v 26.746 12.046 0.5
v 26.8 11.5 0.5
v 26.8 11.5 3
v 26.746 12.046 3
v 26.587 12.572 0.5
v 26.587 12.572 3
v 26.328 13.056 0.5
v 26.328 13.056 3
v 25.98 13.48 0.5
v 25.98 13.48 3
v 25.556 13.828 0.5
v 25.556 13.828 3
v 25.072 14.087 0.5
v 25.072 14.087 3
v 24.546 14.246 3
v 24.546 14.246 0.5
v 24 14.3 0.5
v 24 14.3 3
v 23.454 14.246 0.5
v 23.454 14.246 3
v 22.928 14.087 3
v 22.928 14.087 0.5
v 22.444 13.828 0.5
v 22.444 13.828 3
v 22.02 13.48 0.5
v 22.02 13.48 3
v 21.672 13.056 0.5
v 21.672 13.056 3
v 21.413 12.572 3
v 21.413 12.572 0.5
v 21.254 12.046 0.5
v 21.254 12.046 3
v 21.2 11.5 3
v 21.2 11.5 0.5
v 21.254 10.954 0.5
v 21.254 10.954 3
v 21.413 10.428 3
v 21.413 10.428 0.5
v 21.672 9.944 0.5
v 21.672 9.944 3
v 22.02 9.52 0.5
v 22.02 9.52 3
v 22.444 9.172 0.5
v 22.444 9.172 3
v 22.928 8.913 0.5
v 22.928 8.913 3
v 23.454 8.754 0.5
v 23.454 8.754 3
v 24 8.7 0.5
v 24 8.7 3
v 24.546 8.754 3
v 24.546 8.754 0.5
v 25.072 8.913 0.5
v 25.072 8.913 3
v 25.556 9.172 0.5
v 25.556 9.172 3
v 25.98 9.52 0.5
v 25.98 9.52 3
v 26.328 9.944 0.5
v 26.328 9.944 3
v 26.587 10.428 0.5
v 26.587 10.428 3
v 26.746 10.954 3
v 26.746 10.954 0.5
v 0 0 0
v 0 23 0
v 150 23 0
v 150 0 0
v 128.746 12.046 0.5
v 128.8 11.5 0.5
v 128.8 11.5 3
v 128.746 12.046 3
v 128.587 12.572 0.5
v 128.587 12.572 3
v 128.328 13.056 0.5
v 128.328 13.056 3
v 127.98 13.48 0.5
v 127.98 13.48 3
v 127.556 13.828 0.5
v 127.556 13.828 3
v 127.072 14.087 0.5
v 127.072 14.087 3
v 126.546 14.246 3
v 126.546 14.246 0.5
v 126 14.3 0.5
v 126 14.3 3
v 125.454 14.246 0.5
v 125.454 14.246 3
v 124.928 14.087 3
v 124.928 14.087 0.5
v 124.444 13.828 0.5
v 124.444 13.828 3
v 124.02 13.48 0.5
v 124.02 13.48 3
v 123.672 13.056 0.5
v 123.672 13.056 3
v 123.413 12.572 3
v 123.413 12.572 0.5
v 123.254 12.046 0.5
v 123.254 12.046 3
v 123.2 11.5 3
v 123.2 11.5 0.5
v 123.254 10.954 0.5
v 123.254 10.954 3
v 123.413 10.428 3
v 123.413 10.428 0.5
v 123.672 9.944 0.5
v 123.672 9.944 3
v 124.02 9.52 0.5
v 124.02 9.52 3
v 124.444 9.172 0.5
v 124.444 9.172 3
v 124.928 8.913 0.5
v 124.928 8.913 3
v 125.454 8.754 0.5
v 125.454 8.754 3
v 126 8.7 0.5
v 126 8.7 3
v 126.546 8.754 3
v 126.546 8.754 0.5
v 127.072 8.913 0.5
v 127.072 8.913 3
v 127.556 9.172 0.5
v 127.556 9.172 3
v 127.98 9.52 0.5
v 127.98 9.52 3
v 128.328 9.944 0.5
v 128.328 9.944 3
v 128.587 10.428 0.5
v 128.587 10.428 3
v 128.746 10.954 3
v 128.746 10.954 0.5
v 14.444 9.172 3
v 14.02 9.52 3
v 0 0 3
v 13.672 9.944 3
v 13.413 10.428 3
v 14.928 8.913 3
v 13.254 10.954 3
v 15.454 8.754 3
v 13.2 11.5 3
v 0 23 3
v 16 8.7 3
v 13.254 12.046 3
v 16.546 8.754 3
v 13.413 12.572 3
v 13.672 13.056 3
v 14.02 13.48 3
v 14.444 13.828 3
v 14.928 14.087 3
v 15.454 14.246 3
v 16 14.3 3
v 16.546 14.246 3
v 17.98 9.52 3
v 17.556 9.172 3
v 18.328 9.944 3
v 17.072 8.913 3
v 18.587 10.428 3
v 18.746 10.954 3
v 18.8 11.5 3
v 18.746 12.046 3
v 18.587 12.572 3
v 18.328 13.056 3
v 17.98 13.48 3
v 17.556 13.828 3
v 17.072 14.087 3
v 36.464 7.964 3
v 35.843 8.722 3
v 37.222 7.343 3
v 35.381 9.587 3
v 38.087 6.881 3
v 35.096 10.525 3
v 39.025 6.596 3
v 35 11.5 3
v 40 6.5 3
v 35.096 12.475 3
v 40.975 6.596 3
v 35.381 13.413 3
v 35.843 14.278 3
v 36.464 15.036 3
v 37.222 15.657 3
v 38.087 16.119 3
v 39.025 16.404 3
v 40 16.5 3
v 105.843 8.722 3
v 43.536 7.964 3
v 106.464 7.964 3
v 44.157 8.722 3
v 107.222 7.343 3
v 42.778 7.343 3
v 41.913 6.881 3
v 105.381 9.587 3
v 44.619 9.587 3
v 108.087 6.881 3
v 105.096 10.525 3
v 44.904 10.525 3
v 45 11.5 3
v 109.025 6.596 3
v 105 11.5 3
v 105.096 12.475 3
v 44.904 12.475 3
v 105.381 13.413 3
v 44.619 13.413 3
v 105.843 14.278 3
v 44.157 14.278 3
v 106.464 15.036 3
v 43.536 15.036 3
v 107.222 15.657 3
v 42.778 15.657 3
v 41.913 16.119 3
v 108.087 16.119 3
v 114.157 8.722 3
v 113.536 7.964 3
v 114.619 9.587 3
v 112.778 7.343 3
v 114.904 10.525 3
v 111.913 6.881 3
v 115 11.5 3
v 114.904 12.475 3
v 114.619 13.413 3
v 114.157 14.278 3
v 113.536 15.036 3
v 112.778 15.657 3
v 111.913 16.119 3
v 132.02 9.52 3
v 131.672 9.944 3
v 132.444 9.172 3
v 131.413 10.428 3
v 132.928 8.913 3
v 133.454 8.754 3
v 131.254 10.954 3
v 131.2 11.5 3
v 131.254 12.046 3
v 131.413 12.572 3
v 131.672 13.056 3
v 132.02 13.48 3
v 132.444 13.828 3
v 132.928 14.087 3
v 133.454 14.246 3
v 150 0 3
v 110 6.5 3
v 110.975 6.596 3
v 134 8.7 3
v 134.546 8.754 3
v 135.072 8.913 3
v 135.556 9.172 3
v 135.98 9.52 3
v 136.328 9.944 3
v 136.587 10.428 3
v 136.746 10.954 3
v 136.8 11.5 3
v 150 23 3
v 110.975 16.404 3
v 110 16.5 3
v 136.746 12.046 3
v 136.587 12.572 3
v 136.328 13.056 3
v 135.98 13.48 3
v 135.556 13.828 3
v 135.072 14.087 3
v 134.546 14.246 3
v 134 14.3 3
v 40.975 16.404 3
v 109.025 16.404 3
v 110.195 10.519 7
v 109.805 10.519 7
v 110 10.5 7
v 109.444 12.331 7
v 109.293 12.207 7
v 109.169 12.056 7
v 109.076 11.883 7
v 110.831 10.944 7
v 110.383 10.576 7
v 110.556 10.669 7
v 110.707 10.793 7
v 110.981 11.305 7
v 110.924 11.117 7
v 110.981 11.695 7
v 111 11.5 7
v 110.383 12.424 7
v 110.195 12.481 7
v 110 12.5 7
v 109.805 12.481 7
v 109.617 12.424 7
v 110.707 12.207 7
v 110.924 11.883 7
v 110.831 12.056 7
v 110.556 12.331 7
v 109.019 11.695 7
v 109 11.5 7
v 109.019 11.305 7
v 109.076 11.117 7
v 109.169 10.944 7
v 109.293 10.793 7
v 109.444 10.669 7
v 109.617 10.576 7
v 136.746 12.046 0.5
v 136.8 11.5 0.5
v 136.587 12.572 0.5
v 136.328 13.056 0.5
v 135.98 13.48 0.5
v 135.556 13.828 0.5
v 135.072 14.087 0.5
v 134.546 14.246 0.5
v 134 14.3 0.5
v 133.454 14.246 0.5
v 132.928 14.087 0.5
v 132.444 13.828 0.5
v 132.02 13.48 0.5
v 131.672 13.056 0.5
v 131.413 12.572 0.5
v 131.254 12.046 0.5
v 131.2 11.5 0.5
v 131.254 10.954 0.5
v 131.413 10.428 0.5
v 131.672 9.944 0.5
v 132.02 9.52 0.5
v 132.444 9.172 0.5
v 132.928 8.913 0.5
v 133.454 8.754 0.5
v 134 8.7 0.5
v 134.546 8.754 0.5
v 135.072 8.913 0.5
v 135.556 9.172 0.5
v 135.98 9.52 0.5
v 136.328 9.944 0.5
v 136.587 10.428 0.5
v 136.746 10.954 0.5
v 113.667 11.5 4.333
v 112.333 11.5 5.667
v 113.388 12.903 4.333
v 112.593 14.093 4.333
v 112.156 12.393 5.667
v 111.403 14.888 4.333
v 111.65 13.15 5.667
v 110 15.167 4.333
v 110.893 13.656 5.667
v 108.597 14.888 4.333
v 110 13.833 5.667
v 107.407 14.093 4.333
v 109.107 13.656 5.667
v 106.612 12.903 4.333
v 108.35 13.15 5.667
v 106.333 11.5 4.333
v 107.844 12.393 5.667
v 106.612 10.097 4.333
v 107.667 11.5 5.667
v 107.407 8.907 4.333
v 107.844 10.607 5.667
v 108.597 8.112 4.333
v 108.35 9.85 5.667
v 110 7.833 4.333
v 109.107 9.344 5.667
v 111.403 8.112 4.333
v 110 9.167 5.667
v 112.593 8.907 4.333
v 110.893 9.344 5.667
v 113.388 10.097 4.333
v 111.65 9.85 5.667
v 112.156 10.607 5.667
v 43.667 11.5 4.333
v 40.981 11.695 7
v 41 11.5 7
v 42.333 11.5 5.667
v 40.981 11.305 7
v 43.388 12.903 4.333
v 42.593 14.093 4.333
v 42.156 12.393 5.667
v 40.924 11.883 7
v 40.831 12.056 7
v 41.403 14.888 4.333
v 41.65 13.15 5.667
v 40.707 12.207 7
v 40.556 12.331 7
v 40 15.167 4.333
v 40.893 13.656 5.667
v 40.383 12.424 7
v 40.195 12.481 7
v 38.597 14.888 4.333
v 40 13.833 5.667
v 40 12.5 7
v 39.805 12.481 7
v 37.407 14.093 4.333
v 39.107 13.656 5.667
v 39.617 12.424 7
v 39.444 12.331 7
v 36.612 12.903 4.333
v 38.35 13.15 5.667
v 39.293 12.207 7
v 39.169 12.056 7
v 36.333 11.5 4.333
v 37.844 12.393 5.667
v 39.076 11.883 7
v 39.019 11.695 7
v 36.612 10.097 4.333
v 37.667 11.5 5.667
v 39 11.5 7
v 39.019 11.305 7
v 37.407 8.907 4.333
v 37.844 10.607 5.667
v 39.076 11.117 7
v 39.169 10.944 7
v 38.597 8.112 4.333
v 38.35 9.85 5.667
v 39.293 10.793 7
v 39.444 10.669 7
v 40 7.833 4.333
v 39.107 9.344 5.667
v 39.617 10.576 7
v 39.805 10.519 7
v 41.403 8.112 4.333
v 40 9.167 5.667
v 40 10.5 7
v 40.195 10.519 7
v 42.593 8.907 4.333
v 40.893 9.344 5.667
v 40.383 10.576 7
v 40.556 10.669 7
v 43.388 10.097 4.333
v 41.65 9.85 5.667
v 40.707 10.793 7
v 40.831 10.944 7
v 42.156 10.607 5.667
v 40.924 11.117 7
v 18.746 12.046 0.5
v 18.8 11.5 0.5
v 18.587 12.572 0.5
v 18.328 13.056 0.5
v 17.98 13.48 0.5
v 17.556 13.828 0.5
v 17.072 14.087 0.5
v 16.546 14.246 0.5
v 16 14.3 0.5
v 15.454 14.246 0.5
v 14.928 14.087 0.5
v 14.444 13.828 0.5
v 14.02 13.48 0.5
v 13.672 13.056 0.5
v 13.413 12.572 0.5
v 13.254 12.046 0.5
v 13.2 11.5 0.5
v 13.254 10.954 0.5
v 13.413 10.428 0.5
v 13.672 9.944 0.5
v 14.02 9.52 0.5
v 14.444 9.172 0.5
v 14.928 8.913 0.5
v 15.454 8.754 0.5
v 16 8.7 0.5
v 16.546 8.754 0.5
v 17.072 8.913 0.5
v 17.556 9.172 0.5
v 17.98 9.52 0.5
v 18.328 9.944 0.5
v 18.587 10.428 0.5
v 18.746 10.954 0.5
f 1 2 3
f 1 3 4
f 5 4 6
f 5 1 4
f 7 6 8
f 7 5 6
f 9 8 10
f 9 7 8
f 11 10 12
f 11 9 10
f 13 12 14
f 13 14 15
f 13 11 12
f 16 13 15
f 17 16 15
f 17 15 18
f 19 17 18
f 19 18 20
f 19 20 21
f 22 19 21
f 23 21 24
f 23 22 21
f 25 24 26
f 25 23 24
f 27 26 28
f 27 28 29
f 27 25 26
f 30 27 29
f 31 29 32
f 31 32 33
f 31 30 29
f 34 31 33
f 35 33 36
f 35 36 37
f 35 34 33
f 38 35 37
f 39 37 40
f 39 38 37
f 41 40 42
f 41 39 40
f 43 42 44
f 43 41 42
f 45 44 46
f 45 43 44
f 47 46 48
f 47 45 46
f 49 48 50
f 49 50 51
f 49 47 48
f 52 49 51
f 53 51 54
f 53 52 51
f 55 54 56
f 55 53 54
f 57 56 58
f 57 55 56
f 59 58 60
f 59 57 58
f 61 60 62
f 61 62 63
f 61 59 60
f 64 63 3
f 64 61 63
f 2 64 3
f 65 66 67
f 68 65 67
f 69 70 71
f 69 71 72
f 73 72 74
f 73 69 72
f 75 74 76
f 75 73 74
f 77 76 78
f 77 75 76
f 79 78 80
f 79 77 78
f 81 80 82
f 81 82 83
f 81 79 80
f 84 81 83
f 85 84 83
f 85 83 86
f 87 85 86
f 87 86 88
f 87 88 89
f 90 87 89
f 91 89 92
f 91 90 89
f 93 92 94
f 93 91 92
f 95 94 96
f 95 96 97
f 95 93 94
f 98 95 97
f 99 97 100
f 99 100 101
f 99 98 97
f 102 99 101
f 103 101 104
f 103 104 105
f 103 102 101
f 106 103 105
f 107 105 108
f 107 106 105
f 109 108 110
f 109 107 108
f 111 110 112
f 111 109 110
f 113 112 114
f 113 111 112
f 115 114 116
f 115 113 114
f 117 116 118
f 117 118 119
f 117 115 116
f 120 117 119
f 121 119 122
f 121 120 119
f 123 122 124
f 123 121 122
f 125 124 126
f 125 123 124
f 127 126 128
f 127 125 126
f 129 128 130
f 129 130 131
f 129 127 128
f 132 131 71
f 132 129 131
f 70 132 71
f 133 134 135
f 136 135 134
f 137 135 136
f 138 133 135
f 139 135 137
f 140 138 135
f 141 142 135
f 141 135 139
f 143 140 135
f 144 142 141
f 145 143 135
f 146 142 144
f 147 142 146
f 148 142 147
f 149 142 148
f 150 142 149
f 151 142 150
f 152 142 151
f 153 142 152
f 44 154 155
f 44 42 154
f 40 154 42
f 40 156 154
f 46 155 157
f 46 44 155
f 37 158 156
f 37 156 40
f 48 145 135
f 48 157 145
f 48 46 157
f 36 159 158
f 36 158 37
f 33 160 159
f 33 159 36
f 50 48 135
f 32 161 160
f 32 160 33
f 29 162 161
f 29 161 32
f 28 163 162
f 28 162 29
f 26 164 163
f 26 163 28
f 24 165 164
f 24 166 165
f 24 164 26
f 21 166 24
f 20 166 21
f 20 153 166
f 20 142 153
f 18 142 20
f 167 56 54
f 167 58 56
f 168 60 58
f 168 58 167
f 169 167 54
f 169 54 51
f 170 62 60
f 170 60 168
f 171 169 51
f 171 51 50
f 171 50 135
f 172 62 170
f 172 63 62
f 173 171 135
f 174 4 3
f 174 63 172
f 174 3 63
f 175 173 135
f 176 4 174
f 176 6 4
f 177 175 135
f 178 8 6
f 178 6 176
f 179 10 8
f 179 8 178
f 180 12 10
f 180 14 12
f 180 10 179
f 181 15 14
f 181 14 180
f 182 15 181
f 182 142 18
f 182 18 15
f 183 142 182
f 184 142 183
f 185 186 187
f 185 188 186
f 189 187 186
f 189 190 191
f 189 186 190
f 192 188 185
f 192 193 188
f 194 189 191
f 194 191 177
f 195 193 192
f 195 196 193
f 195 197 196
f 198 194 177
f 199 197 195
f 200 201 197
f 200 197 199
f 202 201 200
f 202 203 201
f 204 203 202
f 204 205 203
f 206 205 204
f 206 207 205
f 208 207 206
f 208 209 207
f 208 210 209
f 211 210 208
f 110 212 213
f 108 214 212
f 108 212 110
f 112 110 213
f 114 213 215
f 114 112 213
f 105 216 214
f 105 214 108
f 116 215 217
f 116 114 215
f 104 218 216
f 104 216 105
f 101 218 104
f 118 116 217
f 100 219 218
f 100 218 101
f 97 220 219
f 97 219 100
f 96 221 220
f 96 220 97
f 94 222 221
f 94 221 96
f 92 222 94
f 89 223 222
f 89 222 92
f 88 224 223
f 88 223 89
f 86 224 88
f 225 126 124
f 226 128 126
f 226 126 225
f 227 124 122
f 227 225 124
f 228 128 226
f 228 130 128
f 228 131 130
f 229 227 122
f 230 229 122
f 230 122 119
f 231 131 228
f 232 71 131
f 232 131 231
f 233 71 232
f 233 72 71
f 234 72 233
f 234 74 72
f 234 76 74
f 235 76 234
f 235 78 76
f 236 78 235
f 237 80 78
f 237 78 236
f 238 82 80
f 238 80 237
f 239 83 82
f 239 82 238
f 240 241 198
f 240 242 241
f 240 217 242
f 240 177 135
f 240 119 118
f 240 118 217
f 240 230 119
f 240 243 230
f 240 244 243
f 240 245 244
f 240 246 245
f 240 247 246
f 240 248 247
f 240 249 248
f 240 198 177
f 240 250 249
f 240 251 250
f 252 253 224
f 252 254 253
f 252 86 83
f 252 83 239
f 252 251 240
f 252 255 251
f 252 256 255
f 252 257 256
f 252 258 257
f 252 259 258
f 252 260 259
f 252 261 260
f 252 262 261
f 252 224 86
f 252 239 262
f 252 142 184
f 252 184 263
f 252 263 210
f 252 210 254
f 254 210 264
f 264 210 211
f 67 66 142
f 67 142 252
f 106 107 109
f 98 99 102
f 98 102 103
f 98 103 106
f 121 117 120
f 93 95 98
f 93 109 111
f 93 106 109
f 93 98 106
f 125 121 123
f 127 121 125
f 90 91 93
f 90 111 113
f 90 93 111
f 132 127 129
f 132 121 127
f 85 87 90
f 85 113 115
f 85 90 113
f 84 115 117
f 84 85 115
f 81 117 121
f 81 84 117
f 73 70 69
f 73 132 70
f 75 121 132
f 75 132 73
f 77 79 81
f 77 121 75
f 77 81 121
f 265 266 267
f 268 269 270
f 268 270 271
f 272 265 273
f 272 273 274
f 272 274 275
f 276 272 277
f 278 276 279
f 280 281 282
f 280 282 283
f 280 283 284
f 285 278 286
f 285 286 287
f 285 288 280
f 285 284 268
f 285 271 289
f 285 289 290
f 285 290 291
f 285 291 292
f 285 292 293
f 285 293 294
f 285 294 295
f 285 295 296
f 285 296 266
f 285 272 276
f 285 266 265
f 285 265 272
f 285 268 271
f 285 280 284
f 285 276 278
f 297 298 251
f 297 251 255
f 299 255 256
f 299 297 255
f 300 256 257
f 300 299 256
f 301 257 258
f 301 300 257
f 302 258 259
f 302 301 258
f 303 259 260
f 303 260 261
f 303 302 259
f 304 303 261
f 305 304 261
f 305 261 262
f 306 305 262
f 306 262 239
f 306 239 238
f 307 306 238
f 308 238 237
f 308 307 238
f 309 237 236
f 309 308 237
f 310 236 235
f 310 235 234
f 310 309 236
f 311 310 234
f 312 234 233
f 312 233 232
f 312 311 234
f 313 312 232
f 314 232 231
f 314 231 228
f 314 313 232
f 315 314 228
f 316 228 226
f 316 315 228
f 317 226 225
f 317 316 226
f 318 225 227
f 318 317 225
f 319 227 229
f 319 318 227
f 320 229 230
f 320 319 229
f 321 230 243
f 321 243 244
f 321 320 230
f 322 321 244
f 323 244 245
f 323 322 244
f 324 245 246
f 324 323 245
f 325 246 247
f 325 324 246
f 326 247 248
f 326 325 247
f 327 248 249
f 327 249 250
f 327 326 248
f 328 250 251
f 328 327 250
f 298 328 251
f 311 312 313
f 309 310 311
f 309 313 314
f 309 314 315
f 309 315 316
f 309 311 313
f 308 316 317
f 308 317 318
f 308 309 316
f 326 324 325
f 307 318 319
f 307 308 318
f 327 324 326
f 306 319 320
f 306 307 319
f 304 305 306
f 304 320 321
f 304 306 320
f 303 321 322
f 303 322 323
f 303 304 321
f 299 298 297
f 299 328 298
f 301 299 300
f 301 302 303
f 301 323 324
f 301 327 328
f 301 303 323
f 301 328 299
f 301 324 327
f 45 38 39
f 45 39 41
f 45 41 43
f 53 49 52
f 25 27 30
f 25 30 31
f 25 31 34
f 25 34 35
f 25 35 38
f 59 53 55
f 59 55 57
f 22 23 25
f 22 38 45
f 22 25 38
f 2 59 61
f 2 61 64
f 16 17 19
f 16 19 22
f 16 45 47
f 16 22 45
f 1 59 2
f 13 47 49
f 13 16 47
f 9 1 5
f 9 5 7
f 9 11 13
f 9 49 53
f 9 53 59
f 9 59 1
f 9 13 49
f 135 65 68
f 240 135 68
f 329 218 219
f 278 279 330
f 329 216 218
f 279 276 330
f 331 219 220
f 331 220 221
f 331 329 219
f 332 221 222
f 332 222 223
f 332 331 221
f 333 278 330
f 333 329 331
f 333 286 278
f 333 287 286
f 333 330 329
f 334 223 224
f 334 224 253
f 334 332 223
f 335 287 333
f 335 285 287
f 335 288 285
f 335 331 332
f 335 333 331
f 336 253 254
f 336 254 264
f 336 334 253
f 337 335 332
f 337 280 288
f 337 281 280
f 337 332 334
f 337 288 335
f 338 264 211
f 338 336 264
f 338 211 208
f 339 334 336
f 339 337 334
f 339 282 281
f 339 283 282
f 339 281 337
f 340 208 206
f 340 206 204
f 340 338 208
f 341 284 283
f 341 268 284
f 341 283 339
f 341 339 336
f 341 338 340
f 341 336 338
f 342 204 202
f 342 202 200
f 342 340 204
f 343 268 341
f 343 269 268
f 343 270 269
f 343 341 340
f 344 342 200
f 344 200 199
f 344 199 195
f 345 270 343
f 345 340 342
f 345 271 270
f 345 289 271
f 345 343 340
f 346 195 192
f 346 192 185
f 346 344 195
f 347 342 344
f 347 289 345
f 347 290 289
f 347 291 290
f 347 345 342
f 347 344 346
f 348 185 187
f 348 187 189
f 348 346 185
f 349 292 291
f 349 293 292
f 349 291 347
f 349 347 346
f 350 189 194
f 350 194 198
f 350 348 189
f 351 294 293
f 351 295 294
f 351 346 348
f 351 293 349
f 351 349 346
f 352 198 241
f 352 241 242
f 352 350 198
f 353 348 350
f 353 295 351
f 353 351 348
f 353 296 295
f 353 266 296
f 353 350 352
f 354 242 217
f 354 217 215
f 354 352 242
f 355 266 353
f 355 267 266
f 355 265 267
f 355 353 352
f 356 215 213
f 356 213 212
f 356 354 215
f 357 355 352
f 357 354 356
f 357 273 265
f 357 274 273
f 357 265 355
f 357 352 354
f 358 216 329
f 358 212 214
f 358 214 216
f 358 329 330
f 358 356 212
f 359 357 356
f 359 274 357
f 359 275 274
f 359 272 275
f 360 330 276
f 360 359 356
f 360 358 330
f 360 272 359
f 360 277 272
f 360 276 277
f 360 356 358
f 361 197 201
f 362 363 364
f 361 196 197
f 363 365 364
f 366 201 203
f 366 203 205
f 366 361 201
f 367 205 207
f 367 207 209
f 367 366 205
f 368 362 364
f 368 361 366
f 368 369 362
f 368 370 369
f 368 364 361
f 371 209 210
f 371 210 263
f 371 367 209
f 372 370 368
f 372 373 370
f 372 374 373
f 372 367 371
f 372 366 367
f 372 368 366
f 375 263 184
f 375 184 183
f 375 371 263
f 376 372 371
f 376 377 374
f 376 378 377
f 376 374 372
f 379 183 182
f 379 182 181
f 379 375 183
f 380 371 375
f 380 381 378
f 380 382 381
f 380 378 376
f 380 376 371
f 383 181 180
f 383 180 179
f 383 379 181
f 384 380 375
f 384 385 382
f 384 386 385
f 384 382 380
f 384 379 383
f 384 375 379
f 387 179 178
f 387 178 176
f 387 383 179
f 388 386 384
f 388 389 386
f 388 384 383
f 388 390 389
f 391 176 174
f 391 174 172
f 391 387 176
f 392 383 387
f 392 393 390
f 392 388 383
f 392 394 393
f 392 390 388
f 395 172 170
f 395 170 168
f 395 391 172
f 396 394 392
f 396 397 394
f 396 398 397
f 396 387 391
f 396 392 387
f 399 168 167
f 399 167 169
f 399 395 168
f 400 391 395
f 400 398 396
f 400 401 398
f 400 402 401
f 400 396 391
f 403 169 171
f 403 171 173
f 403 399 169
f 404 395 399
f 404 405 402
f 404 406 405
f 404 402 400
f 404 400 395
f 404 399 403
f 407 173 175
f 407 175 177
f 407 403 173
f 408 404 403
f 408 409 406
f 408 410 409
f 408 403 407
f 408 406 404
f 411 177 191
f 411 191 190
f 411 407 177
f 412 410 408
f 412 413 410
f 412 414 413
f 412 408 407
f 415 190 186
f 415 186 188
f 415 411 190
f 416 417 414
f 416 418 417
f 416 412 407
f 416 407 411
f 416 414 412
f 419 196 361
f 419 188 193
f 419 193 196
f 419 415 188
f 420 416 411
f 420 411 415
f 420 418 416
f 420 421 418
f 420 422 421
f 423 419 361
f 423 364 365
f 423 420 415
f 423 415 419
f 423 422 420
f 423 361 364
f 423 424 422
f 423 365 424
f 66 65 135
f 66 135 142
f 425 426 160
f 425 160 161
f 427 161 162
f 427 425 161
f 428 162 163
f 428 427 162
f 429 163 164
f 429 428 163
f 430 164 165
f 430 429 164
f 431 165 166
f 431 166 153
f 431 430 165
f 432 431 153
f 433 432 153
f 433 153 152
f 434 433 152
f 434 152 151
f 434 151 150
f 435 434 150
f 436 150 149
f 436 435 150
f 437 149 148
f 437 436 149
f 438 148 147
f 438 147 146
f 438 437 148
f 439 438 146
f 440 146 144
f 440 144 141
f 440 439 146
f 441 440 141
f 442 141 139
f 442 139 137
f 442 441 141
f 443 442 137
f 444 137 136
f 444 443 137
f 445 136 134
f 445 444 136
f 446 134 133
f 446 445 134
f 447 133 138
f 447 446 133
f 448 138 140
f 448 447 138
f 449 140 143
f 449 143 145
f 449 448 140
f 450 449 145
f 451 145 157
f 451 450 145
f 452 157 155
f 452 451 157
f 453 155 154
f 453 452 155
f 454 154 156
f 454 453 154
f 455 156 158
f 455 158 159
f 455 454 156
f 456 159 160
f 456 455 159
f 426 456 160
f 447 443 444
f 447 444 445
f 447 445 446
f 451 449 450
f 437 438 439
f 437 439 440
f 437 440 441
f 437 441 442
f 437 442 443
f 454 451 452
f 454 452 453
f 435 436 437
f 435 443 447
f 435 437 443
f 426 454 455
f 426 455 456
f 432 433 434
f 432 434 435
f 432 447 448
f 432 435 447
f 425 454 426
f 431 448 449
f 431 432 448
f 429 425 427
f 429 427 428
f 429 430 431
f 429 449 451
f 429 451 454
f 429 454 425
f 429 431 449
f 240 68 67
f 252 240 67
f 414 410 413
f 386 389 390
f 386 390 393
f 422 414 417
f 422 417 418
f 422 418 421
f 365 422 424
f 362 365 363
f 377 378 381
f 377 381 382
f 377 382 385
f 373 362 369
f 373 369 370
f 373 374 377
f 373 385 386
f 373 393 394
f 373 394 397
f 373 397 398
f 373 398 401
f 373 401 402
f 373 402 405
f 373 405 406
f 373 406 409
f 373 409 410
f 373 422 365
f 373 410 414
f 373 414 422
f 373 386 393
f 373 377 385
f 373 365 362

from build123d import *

# Parameters (mm, degrees)
CYLINDER002_R     = 2.8
CYLINDER002_DEPTH = 2.5
CYLINDER001_R     = 2.8
CYLINDER001_DEPTH = 2.5
CYLINDER003_R     = 2.8
CYLINDER003_DEPTH = 2.5
CYLINDER_R        = 2.8
CYLINDER_DEPTH    = 2.5
BOX_W             = 150
BOX_H             = 23
BOX_DEPTH         = 3


with BuildPart() as cylinder002:
    # Cylinder002 → Cylinder002 (new body)
    with BuildSketch(Plane(origin=(126, 11.5, 0.5), x_dir=(1, 0, 0), z_dir=(0, 0, 1))):
        Circle(CYLINDER002_R)
    extrude(amount=CYLINDER002_DEPTH)


with BuildPart() as cylinder001:
    # Cylinder001 → Cylinder001 (new body)
    with BuildSketch(Plane(origin=(24, 11.5, 0.5), x_dir=(1, 0, 0), z_dir=(0, 0, 1))):
        Circle(CYLINDER001_R)
    extrude(amount=CYLINDER001_DEPTH)


with BuildPart() as cylinder003:
    # Cylinder003 → Cylinder003 (new body)
    with BuildSketch(Plane(origin=(134, 11.5, 0.5), x_dir=(1, 0, 0), z_dir=(0, 0, 1))):
        Circle(CYLINDER003_R)
    extrude(amount=CYLINDER003_DEPTH)


with BuildPart() as fusion:
    # Cylinder → Cylinder (new body)
    with BuildSketch(Plane(origin=(16, 11.5, 0.5), x_dir=(1, 0, 0), z_dir=(0, 0, 1))):
        Circle(CYLINDER_R)
    extrude(amount=CYLINDER_DEPTH)

    # Fusion: union Cylinder002, Cylinder001, Cylinder003
    add(cylinder002.part)
    add(cylinder001.part)
    add(cylinder003.part)


with BuildPart() as cone:
    # Cone → Cone (revolve)
    with BuildSketch(Plane(origin=(40, 11.5, 3), x_dir=(1, 0, 0), z_dir=(0, -1, 0))):
        Polygon((0, 0), (5, 0), (1, 4), (0, 4), align=None)
    revolve(axis=Axis((40, 11.5, 3), (0, 0, 1)))


with BuildPart() as base:
    # Box → Box (new body)
    with BuildSketch(Plane.XY):
        with Locations((75, 11.5)):
            Rectangle(BOX_W, BOX_H)
    extrude(amount=BOX_DEPTH)


with BuildPart() as bottom:
    # Cone001 → Cone001 (revolve)
    with BuildSketch(Plane(origin=(110, 11.5, 3), x_dir=(1, 0, 0), z_dir=(0, -1, 0))):
        Polygon((0, 0), (5, 0), (1, 4), (0, 4), align=None)
    revolve(axis=Axis((110, 11.5, 3), (0, 0, 1)))

    # Fusion001: union Cone, base
    add(cone.part)
    add(base.part)

    # Cut: cut Fusion
    add(fusion.part, mode=Mode.SUBTRACT)


solid = bottom.part
